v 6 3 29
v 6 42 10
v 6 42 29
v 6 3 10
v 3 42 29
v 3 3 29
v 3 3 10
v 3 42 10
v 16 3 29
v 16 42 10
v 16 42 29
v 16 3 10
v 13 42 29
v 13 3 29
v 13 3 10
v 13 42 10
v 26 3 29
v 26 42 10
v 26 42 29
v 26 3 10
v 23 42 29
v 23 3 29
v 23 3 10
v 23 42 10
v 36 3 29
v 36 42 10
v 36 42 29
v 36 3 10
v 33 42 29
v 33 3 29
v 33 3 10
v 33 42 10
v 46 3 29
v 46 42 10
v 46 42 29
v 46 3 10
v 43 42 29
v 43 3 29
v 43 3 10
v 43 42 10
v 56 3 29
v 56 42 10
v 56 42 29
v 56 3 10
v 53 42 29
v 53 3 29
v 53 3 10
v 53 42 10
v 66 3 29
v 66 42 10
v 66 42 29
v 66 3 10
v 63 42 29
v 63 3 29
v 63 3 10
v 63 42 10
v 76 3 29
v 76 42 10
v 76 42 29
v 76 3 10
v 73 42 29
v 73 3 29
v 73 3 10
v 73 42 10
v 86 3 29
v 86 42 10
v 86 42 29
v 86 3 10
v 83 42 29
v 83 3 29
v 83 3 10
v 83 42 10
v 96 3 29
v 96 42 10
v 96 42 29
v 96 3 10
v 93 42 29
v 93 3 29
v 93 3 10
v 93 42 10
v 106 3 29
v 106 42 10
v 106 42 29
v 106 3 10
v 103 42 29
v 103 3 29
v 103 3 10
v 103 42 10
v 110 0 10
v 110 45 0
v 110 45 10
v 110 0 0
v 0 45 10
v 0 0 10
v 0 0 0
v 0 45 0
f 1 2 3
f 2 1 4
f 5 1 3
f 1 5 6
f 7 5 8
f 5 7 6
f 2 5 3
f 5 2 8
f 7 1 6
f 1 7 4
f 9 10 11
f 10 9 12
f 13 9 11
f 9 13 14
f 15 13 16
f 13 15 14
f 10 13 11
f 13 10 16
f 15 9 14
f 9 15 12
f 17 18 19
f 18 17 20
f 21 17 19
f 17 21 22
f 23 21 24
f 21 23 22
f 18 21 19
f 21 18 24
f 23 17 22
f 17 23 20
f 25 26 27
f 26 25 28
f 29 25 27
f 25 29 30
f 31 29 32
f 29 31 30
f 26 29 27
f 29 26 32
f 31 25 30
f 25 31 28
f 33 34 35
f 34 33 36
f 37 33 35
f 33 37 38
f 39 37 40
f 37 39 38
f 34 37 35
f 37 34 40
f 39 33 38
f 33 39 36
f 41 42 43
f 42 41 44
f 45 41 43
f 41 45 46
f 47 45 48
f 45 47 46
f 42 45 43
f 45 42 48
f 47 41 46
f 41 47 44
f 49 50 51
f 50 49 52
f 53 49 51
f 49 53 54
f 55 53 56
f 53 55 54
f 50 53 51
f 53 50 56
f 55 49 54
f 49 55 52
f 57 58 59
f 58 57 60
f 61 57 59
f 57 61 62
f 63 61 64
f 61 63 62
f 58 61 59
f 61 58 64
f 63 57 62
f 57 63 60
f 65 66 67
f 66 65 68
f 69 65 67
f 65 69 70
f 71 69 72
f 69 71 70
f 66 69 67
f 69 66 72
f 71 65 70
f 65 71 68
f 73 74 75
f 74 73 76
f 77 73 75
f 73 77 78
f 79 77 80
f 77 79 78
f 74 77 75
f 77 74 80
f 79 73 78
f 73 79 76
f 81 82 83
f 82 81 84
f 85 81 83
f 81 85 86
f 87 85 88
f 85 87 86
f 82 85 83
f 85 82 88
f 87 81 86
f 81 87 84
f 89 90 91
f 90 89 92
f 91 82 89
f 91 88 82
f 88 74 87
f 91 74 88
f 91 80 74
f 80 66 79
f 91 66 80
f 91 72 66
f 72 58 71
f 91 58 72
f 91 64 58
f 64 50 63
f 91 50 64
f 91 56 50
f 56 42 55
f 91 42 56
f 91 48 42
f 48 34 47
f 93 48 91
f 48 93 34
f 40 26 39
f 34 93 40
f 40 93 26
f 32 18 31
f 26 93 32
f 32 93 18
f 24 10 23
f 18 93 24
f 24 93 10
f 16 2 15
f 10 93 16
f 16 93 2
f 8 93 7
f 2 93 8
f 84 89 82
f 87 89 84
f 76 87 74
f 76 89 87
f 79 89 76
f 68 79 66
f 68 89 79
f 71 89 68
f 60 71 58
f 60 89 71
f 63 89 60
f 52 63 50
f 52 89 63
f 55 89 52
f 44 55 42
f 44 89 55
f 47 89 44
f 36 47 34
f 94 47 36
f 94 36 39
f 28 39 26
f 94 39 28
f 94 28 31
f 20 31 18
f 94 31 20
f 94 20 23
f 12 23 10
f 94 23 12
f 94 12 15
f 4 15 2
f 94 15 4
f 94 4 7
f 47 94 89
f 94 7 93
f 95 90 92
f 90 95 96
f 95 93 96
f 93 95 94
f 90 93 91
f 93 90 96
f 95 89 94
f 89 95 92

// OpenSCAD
$fn = 32;

// ----------------------------------------------------------------------
// Heatsink: uniform fin block
// ----------------------------------------------------------------------

// --- parameters (mm) ---
base_l = 110;             // base length, X
base_w = 45;              // base width, Y
base_t = 10;              // base plate thickness
fin_h = 20;               // fin height above the base
fin_t = 3;                // fin thickness
edge = 3;                 // margin from the base ends
pitch = 10;               // fin pitch

n_fins = floor((base_l - 2 * edge - fin_t) / pitch) + 1;  // fin count
total_h = base_t + fin_h - 1;  // overall height

union() {
  cube([base_l, base_w, base_t]);
  for (i = [0 : n_fins - 1])
    translate([edge + i * pitch, edge, base_t - 1])
      cube([fin_t, base_w - 2 * edge, fin_h]);
}
